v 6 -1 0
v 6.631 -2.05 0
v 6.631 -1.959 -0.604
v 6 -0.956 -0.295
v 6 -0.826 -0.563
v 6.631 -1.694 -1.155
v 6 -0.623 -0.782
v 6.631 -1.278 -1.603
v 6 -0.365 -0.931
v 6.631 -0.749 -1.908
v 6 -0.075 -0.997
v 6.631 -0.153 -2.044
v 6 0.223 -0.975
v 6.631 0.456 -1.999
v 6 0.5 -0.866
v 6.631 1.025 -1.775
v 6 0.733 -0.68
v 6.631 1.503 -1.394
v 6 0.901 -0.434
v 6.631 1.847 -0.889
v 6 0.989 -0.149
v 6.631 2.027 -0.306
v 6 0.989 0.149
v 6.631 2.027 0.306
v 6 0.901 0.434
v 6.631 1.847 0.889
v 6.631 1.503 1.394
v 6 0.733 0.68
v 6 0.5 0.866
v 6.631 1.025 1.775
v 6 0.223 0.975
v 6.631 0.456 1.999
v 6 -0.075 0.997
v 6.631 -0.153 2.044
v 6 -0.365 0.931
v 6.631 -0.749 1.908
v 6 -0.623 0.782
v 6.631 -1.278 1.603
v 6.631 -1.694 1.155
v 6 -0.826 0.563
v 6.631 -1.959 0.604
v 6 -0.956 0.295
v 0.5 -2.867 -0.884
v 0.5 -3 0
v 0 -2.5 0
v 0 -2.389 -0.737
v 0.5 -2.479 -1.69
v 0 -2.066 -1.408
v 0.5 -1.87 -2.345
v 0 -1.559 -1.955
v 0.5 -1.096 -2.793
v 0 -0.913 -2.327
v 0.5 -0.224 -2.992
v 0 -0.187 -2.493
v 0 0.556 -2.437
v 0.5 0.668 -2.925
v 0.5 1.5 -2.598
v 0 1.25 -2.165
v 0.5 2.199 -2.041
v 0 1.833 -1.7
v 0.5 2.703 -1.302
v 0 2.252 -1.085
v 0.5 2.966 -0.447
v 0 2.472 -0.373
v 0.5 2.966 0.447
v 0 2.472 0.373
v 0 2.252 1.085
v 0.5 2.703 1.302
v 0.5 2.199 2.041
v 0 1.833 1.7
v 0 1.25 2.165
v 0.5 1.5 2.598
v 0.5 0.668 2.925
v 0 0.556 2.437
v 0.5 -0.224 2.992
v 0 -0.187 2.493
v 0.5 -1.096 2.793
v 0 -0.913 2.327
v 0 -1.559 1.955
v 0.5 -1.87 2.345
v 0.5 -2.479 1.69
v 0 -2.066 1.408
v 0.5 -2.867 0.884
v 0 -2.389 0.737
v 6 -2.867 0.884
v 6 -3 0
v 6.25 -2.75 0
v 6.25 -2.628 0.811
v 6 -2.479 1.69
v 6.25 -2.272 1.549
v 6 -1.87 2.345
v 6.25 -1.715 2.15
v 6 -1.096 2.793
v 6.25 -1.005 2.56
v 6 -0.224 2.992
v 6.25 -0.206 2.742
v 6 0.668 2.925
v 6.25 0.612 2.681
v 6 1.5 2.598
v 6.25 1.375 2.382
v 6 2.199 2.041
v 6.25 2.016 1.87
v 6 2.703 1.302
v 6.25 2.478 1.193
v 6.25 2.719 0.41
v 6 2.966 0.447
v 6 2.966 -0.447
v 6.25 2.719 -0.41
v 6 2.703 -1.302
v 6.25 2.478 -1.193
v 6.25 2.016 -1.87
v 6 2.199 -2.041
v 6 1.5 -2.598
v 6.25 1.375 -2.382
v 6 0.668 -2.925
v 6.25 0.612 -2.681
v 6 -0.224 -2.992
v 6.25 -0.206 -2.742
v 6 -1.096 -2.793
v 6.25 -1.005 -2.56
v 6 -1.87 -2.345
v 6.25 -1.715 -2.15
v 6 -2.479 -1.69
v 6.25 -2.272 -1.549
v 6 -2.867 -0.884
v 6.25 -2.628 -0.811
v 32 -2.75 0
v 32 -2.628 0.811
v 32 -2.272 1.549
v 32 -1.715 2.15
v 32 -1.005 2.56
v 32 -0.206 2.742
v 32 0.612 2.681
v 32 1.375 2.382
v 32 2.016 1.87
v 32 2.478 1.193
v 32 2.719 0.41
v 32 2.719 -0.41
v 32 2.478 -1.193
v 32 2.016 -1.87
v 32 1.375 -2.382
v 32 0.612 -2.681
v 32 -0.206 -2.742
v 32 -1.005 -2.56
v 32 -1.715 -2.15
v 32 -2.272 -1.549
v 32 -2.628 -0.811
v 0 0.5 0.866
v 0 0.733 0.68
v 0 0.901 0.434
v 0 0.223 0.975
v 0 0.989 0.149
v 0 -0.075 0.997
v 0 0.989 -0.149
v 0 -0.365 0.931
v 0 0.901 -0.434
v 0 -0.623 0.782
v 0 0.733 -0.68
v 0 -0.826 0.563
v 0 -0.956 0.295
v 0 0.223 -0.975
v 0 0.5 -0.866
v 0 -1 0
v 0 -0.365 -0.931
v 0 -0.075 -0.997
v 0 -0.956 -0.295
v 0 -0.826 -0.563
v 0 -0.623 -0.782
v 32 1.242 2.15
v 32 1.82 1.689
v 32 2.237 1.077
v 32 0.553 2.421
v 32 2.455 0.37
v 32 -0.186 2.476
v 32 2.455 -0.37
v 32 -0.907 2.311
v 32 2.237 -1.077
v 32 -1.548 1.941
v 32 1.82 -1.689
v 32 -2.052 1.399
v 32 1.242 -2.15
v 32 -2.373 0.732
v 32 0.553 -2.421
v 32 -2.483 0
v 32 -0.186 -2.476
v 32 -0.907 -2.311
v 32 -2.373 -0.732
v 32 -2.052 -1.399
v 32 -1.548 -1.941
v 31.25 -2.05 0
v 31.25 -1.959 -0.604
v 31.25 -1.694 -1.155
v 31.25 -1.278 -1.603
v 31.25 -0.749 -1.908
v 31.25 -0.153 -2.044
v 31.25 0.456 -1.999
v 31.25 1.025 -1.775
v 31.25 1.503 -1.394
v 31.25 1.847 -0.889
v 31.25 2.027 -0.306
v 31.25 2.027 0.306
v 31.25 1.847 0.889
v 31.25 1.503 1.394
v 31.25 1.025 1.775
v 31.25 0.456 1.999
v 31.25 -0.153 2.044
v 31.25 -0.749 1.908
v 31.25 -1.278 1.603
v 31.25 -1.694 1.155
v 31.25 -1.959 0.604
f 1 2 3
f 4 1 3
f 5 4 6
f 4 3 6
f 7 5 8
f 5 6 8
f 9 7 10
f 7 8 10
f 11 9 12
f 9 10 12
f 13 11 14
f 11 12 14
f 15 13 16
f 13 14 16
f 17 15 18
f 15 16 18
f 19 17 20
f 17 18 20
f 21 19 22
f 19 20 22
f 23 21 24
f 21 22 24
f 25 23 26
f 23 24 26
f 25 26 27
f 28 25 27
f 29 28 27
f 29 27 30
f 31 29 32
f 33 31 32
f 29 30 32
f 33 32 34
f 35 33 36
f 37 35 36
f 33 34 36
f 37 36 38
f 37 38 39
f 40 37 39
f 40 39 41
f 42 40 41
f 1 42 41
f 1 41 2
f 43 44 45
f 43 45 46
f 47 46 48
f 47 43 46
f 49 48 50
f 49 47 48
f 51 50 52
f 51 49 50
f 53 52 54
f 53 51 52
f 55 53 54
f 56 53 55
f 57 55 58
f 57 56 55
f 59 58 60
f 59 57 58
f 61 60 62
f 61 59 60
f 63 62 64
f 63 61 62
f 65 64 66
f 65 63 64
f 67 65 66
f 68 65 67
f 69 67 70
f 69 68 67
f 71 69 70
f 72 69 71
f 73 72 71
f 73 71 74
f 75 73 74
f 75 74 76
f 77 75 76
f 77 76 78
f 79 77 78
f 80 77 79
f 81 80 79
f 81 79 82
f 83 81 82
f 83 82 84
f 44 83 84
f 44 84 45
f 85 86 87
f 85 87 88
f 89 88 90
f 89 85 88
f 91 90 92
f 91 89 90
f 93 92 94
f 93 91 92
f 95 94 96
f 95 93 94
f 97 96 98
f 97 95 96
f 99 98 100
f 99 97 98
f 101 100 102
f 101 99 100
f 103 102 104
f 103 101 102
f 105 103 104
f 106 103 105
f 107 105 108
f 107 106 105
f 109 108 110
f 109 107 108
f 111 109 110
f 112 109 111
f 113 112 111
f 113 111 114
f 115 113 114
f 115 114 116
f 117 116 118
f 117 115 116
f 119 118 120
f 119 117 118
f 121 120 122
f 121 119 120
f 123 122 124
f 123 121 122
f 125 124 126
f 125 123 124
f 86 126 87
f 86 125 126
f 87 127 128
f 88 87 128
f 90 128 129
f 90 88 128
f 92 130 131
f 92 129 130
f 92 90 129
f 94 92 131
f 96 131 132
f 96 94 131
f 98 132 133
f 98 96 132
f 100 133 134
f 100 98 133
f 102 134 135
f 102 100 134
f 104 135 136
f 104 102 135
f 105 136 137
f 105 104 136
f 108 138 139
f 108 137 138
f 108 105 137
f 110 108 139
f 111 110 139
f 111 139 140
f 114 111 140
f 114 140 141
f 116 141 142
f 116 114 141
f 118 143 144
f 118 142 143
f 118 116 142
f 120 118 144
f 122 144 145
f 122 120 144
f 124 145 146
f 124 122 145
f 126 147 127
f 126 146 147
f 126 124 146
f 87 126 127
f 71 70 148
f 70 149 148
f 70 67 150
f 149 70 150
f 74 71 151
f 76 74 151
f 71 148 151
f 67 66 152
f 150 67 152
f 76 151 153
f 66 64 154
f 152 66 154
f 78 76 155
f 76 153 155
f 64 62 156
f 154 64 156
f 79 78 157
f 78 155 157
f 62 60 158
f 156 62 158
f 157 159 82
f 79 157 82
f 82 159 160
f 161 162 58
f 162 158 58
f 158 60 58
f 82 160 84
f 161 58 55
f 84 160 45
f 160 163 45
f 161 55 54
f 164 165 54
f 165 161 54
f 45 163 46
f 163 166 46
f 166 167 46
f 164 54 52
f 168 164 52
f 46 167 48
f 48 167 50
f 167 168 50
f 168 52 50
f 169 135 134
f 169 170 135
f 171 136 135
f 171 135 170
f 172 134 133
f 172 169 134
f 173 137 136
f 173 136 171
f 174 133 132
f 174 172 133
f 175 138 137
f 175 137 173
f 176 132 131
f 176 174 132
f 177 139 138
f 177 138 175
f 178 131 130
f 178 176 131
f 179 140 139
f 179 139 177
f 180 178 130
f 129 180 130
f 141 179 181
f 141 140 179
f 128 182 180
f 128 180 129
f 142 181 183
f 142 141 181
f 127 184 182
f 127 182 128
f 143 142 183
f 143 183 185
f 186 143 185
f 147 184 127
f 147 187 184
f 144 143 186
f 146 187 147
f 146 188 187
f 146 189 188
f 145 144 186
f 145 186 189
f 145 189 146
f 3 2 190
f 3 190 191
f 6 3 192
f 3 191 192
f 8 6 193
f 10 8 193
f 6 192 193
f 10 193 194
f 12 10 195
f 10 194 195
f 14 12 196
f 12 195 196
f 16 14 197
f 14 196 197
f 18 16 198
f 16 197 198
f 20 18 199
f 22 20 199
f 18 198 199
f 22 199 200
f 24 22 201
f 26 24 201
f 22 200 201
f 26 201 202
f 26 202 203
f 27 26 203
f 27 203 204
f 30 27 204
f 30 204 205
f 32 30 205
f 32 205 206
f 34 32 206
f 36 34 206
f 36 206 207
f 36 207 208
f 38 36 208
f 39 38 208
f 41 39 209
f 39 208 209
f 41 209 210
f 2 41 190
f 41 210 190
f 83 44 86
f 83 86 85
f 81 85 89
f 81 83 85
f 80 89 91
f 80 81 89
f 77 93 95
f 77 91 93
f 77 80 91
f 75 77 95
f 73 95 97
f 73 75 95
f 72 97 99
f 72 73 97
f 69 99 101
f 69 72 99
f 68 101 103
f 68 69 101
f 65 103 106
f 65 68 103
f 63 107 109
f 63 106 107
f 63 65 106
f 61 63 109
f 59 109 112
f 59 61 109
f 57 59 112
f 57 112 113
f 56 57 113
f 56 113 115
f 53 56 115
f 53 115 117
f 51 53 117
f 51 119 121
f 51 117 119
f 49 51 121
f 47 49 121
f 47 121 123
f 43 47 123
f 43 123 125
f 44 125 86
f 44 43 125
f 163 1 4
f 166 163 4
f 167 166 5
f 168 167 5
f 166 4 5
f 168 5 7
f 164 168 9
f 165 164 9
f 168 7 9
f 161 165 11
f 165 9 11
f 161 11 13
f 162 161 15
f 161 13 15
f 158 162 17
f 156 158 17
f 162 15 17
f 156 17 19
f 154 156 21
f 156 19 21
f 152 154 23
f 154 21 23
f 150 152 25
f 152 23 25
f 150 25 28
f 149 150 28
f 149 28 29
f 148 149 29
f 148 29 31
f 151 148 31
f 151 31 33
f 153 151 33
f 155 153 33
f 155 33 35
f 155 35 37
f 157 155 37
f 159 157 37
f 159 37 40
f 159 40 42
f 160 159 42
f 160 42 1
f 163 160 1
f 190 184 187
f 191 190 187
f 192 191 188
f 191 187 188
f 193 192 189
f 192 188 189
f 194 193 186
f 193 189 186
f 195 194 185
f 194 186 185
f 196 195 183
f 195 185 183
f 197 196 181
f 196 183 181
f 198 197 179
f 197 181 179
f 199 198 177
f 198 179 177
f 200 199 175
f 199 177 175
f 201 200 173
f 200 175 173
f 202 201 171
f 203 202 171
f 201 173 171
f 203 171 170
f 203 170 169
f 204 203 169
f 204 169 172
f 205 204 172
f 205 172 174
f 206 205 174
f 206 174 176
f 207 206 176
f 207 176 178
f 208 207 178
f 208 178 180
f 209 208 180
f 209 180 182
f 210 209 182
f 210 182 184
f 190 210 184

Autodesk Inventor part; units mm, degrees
ref_plane "YZ Plane" through (0, 0, 0) normal (1, 0, 0) x (0, 1, 0)
ref_plane "XZ Plane" through (0, 0, 0) normal (0, 1, 0) x (-1, 0, 0)
ref_plane "XY Plane" through (0, 0, 0) normal (0, 0, 1) x (1, 0, 0)
sketch "Náčrt1" plane through (0, 0, 0) normal (0, 0, 1) x (1, 0, 0)
  line L0 (0, -3.6) -> (0, 0.6) projected
  line L1 (-6.4, 0) -> (38.4, 0) projected
  line L2 (0, -1) -> (6, -1)
  line L3 (32, -2.75) -> (6.25, -2.75)
  line L4 (6.25, -2.75) -> (6, -3)
  line L5 (6, -3) -> (0.5, -3)
  line L6 (0.5, -3) -> (0, -2.5)
  line L7 (0, -2.5) -> (0, -1)
  line L8 (32, -2.75) -> (32, -2.05)
  line L9 (6, -1) -> (6.6309, -2.05)
  line L10 (6.6309, -2.05) -> (32, -2.05)
  point P0 (0, 0)
  dimension "d0" = 2
  dimension "d1" = 5.5
  dimension "d3" = 6
  dimension "d4" = 45
  dimension "d5" = 6
  dimension "d6" = 0.5
  dimension "d7" = 90
  dimension "d16" = 4.1
  dimension "d17" = 59
  dimension "d18" = 26
  dimension "d19" = 6
revolve "Rotace1" add sketch "Náčrt1" angle 360 about axis through (-10, 0, 0) along (1, 0, 0)
thread "Závit1" size "M6x1" class "6g" standard "ANSI Metric M Profile" full length
chamfer "Zkosení1" distance 0.75 angle 30 1 edges at (32, 2.05, 0) measured on face at (15.0873, -2.0235, 0.3288)
